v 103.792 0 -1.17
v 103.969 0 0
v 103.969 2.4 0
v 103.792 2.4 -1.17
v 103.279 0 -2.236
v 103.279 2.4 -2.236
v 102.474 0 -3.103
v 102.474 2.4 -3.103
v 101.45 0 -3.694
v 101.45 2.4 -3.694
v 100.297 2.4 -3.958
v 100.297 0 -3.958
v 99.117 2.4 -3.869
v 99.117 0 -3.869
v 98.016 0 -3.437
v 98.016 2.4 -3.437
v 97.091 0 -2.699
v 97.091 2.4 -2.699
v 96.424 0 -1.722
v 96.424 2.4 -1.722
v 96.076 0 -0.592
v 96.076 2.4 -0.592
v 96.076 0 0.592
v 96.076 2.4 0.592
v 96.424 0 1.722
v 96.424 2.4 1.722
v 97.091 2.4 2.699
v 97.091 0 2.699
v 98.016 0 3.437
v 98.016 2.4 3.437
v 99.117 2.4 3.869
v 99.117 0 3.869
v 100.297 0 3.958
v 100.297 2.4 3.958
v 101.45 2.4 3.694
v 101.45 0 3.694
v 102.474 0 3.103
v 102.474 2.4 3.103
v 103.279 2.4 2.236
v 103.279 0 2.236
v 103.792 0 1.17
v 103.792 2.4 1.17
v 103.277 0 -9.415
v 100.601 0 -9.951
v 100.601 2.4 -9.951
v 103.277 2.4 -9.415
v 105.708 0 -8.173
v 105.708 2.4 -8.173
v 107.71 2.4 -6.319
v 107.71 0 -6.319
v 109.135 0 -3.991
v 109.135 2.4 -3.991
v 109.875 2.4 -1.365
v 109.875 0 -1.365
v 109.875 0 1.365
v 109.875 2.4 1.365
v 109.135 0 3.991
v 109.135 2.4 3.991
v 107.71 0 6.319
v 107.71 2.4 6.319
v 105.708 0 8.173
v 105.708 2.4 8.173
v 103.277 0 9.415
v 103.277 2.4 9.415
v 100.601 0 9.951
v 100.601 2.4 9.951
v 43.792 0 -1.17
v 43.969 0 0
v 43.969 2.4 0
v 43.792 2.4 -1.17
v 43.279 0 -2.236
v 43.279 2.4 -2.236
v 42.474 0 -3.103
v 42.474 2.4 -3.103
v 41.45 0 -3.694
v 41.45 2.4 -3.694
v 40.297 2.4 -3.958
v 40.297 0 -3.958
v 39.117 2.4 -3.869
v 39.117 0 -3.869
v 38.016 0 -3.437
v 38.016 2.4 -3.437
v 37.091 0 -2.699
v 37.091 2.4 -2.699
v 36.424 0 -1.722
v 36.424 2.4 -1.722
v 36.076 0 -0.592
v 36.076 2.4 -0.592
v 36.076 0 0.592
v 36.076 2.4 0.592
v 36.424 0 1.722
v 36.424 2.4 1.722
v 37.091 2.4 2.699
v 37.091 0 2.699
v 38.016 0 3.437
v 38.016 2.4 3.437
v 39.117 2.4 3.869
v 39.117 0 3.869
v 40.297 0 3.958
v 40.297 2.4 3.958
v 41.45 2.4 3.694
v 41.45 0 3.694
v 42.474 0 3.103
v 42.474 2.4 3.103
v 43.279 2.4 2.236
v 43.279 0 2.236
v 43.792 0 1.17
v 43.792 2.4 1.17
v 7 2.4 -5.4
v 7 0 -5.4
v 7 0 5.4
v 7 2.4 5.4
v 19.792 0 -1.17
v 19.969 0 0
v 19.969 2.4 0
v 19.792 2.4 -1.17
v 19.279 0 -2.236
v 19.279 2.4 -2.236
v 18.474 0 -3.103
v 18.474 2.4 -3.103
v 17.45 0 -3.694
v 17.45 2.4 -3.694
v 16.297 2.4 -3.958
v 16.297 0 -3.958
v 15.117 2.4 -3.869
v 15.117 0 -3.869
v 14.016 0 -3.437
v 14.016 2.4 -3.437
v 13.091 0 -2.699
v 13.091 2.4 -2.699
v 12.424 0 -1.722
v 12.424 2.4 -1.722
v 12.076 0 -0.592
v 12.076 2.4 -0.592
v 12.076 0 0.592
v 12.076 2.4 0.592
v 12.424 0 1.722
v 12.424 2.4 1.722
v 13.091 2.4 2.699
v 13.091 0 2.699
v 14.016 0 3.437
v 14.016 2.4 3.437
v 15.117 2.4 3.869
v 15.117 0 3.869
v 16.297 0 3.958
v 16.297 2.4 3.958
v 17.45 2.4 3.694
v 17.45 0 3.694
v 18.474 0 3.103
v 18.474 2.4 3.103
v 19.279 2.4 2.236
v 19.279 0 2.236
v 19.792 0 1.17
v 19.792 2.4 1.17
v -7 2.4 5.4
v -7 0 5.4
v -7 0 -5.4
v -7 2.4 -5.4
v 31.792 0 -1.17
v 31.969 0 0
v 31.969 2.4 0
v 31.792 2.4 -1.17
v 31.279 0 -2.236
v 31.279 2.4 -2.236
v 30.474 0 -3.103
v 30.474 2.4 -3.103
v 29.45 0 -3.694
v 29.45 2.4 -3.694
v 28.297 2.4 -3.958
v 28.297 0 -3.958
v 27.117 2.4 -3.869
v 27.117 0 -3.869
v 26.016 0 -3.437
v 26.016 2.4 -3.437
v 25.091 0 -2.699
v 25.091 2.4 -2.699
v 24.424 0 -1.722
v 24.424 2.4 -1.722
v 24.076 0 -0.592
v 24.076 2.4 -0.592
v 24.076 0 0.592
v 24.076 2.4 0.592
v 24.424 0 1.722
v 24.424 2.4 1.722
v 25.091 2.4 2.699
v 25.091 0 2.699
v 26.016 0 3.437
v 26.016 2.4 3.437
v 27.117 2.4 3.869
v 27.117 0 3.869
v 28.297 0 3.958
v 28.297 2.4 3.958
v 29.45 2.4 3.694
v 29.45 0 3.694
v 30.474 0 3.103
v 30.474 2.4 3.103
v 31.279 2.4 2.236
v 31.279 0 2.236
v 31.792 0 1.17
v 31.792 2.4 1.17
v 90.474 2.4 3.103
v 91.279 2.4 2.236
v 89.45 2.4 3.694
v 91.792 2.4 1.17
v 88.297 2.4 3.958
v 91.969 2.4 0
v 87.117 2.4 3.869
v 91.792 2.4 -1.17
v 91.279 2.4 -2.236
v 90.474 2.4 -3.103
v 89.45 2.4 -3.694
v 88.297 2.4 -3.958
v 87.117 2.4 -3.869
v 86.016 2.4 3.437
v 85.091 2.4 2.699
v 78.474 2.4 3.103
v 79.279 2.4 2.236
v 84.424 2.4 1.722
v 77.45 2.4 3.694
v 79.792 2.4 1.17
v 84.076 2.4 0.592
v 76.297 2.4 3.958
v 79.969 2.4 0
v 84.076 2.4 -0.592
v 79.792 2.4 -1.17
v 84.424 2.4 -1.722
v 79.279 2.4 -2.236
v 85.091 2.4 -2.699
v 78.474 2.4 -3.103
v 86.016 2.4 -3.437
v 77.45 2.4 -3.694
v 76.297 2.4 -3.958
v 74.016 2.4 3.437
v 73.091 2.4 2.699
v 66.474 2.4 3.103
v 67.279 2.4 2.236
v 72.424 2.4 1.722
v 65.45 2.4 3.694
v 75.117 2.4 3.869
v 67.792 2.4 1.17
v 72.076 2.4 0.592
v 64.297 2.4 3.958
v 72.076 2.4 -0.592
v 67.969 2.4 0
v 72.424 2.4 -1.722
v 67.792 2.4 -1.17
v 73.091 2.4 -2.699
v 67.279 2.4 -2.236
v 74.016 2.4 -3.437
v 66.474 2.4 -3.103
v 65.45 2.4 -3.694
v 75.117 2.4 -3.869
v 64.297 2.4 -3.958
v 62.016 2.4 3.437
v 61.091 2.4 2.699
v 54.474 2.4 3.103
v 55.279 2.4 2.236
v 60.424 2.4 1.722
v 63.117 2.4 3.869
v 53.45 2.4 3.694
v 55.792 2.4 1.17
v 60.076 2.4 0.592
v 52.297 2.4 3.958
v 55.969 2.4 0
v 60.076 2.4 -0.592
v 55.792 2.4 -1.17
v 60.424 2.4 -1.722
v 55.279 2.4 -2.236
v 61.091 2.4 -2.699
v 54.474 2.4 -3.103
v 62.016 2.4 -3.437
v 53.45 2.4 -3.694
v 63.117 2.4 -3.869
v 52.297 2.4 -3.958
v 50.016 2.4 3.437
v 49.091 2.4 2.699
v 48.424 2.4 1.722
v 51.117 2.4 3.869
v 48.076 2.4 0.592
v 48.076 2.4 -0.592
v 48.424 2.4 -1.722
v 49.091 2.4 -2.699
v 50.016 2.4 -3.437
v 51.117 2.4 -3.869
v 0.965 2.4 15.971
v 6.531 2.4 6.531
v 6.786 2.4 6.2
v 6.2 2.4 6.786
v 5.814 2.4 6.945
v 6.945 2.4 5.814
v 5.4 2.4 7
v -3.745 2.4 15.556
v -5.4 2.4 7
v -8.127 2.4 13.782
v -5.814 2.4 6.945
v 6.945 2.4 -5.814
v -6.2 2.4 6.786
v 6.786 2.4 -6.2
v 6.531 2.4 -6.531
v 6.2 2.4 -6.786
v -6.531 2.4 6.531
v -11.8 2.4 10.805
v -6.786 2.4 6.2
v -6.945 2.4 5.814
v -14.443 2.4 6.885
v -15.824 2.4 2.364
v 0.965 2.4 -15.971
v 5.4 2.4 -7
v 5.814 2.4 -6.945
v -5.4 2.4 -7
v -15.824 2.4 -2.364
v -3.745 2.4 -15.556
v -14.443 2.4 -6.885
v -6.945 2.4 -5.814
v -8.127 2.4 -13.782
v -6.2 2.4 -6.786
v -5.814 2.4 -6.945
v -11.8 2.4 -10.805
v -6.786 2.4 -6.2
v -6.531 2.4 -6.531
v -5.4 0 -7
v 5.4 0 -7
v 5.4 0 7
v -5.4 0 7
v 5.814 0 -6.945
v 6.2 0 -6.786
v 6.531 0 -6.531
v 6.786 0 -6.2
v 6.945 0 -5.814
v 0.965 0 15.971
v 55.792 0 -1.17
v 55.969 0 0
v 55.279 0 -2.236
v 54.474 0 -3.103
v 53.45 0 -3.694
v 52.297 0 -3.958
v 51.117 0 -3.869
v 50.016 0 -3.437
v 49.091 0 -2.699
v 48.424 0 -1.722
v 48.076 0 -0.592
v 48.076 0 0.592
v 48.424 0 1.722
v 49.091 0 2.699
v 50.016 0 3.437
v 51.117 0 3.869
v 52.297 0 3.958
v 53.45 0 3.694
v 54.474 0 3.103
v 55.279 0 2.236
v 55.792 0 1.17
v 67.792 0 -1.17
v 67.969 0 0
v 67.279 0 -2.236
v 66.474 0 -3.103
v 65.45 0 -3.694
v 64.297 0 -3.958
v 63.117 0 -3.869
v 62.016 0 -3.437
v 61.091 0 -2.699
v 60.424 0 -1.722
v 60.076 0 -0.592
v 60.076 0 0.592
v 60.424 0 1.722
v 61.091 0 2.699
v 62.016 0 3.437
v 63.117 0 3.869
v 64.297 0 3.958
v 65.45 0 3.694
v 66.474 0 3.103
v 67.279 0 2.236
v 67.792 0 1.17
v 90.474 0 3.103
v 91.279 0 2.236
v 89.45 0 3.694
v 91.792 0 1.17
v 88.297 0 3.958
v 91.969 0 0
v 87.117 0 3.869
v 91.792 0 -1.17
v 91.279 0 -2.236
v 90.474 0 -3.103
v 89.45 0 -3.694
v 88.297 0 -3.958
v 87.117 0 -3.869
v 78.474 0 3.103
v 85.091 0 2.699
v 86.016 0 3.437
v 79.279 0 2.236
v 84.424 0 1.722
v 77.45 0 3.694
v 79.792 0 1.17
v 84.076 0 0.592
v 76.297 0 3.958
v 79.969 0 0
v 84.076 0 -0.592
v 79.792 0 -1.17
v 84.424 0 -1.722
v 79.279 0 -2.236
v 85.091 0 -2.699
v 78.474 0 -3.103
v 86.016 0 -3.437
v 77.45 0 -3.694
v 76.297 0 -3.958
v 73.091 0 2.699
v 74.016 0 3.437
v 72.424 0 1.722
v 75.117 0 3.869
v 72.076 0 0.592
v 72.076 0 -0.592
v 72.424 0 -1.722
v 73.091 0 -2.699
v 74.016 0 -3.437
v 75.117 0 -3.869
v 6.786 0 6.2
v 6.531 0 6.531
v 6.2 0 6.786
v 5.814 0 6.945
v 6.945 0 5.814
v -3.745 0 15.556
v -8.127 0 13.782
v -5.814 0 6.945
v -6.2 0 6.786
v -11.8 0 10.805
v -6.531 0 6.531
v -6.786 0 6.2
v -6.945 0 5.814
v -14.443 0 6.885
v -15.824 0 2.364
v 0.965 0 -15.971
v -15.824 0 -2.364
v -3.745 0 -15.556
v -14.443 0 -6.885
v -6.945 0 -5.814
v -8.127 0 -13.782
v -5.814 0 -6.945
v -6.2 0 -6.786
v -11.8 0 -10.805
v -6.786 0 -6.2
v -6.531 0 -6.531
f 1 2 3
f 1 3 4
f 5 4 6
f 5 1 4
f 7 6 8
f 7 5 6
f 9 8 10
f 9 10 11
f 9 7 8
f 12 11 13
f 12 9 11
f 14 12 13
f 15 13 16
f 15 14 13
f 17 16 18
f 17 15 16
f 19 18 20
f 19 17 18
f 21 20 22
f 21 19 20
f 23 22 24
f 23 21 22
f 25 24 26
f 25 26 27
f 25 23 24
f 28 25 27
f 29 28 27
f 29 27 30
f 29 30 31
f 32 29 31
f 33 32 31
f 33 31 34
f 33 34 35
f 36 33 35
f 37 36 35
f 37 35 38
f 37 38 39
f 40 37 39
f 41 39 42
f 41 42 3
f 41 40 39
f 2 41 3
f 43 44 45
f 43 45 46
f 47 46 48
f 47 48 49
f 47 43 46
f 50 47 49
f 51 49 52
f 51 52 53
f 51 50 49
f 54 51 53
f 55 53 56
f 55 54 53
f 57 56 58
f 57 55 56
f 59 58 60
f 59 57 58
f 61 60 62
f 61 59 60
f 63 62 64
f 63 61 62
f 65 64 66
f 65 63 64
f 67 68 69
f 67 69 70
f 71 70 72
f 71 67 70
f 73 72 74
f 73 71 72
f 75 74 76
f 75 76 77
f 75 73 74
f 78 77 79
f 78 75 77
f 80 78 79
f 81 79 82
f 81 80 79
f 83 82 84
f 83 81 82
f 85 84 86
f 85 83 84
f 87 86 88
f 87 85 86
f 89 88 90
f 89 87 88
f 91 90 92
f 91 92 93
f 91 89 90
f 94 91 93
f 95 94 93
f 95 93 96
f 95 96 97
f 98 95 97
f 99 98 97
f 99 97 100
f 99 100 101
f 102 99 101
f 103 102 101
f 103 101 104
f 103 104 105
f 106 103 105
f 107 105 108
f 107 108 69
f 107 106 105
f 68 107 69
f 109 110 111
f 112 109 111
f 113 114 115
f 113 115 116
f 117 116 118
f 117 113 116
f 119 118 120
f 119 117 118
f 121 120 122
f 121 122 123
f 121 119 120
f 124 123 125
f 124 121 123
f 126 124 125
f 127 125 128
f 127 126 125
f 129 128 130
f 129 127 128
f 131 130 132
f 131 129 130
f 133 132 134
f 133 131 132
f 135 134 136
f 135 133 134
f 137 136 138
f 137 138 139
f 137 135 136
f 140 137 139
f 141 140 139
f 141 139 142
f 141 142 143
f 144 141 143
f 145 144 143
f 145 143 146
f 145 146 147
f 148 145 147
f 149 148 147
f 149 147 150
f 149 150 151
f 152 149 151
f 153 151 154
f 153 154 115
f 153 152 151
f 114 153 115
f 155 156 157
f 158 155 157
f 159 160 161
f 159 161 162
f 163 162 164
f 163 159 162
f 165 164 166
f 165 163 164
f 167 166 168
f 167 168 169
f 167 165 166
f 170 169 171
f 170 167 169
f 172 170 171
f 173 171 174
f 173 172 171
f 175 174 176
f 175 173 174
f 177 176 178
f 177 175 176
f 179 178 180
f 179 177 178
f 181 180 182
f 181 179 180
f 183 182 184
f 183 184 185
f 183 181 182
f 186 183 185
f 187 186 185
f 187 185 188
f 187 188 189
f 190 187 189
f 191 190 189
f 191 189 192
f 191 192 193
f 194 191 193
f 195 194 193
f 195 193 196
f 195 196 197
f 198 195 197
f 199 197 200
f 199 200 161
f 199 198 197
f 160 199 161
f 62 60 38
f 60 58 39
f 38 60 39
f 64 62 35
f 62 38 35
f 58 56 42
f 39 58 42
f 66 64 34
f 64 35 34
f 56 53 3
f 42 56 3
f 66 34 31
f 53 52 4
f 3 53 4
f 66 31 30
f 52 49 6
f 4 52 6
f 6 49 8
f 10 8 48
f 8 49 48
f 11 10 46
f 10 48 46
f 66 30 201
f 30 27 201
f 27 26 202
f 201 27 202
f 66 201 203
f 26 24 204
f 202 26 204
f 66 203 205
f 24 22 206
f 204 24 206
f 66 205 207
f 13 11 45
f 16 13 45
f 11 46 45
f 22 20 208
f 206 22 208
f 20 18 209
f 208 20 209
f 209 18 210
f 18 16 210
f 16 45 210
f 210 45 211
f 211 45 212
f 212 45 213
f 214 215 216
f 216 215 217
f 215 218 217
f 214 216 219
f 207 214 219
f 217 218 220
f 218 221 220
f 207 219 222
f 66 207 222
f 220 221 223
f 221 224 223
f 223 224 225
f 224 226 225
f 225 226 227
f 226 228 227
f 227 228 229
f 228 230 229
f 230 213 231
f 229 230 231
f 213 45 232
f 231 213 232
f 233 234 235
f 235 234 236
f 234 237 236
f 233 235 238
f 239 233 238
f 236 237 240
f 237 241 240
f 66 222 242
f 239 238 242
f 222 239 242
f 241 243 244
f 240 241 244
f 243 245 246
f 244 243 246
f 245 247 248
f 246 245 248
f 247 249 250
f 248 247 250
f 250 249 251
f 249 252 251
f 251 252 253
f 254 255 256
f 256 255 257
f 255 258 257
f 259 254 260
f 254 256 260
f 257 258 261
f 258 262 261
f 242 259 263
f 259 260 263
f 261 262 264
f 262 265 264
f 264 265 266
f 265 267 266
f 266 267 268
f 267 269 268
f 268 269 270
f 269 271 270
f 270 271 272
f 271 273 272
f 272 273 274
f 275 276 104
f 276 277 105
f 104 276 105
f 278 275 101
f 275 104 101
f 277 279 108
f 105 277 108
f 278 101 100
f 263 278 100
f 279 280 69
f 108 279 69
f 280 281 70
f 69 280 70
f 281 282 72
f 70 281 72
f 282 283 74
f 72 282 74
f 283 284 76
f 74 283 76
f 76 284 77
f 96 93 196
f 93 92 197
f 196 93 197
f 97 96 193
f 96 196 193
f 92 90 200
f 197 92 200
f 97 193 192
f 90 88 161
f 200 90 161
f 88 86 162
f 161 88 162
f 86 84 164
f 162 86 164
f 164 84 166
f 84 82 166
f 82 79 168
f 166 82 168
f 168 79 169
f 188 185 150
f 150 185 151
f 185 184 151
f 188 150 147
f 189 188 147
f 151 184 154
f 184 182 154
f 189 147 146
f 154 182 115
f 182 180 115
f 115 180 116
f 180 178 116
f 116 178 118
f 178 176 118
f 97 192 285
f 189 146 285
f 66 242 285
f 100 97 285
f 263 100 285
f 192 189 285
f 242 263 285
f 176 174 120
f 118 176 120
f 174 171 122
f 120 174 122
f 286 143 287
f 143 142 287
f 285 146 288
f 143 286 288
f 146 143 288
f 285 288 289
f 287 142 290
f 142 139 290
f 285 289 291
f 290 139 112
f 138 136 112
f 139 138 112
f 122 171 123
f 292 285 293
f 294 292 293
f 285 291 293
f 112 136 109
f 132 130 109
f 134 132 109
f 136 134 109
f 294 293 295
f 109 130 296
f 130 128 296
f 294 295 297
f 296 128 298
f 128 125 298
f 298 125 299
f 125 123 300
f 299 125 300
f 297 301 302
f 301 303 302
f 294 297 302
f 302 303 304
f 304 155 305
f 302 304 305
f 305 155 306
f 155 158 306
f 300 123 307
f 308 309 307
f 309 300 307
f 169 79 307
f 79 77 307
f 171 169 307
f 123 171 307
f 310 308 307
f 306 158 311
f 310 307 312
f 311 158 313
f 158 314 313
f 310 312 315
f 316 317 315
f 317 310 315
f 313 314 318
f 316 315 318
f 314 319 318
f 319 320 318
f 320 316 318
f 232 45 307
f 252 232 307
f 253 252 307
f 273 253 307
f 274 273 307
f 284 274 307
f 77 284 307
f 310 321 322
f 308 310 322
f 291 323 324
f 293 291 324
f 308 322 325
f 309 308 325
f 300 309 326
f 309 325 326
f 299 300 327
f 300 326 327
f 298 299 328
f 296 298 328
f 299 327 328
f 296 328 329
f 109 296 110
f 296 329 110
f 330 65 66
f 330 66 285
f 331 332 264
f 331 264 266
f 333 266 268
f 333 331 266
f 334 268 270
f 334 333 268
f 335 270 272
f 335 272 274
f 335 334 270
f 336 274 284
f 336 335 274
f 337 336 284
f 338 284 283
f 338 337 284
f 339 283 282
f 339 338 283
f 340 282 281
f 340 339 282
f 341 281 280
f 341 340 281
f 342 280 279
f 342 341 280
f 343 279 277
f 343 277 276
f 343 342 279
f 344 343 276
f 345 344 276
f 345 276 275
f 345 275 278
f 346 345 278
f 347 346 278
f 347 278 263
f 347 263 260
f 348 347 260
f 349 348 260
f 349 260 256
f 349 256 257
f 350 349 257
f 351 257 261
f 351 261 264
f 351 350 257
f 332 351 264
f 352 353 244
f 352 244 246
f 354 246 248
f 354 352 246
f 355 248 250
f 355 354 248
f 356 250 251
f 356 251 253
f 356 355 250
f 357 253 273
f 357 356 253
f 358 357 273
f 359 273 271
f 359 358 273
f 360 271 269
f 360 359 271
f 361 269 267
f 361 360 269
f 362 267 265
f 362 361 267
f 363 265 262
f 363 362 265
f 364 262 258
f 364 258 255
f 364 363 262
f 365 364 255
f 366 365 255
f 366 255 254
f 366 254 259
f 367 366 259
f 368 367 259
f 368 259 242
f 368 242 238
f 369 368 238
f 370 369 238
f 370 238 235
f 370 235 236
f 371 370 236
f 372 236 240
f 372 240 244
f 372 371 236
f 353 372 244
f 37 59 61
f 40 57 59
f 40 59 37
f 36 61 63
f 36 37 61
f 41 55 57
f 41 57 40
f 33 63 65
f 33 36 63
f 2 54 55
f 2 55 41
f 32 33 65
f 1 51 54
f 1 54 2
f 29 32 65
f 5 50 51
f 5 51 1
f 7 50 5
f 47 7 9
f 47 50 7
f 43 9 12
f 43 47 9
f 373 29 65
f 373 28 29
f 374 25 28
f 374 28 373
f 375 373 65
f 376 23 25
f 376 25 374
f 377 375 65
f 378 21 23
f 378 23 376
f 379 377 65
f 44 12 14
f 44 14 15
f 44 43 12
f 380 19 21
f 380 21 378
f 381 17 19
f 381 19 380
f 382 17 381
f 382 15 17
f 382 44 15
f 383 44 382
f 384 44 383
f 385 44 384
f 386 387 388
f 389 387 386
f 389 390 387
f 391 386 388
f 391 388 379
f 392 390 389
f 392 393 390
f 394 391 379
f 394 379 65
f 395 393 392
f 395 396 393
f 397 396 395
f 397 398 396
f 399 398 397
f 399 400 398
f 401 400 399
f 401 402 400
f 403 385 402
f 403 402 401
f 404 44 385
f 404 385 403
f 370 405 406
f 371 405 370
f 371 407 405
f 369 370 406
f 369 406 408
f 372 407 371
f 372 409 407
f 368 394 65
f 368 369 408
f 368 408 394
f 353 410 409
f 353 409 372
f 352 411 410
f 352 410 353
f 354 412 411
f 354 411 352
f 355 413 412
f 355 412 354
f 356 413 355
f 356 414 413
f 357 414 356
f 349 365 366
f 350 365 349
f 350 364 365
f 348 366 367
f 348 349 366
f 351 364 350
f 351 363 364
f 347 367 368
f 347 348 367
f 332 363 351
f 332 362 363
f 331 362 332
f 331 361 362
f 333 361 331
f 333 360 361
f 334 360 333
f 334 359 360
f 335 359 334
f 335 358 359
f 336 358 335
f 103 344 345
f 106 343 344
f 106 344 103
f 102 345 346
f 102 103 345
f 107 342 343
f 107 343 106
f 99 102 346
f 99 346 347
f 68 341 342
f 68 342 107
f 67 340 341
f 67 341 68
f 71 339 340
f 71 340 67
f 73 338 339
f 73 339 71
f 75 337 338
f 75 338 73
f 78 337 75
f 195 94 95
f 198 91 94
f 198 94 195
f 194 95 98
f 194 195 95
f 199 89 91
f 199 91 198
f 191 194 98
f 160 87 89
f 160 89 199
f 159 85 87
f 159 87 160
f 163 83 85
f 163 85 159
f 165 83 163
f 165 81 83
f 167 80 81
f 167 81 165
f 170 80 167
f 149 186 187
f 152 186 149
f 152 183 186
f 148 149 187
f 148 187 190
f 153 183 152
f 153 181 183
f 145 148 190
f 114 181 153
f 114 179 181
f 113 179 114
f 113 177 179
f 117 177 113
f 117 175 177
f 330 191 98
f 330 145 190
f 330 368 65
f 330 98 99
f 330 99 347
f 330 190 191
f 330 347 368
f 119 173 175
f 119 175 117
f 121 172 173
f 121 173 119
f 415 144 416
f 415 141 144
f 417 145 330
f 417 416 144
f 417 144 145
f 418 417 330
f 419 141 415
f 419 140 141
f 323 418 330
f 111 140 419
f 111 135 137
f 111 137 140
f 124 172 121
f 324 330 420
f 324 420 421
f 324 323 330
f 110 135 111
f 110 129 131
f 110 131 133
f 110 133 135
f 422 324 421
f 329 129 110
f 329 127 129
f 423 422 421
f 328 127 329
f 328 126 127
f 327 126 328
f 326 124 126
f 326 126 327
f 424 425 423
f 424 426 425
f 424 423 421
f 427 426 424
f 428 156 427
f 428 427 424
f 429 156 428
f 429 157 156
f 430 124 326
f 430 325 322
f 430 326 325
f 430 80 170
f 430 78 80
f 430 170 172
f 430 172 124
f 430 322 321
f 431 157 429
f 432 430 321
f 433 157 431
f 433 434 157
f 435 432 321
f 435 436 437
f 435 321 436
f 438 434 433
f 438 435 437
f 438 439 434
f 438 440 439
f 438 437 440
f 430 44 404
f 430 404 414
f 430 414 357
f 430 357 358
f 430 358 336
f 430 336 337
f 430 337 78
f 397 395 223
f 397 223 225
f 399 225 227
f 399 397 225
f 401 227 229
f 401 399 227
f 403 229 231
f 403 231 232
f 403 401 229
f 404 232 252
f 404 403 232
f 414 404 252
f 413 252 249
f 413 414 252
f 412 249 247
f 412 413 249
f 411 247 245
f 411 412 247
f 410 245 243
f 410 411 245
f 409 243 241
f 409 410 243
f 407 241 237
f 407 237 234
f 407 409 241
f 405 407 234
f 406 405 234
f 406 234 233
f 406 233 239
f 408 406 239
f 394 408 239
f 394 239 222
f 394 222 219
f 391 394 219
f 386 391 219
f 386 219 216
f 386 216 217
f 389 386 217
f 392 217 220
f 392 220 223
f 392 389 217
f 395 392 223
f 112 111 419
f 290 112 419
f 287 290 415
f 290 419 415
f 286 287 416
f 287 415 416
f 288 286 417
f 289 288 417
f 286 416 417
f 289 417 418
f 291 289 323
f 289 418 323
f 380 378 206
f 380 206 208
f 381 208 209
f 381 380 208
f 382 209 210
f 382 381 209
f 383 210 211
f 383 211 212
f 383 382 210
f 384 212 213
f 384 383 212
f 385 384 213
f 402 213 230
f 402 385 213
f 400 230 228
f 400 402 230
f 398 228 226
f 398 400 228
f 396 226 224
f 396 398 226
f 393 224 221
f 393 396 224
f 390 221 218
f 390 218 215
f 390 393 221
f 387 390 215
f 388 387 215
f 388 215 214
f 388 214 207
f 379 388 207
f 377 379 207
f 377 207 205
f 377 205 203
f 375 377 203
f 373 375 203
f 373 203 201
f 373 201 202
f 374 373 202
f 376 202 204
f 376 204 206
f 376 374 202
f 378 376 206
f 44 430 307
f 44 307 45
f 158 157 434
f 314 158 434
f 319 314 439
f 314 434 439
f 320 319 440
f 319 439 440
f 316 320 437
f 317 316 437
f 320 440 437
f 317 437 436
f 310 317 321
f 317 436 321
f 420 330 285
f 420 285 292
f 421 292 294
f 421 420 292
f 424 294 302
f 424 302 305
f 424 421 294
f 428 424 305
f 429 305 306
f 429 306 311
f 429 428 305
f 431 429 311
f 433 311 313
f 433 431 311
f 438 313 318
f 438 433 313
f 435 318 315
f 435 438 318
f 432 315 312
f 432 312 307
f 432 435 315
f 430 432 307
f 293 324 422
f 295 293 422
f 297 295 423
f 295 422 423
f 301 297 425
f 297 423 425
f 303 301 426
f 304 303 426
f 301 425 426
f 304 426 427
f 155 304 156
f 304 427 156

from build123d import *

# Parameters (mm, degrees)
SKETCH1_R           = 3.96875
BOSS_EXTRUDE1_DEPTH = 2.4


with BuildPart() as part:
    # Sketch1 → Boss-Extrude1 (new body)
    with BuildSketch(Plane(origin=(0, 0, 0), x_dir=(1, 0, 0), z_dir=(0, 1, 0))):
        with BuildLine():
            Line((0.965, 15.970872706), (100.601240234, 9.950602331))
            ThreePointArc((100.601240234, 9.950602331), (109.96875, 0), (100.601240234, -9.950602331))
            Line((100.601240234, -9.950602331), (0.965, -15.970872706))
            ThreePointArc((0.965, -15.970872706), (-16, 0), (0.965, 15.970872706))
        make_face()
        with Locations((16, 0)):
            Circle(SKETCH1_R, mode=Mode.SUBTRACT)
        with Locations((28, 0)):
            Circle(SKETCH1_R, mode=Mode.SUBTRACT)
        with Locations((40, 0)):
            Circle(SKETCH1_R, mode=Mode.SUBTRACT)
        with Locations((52, 0)):
            Circle(SKETCH1_R, mode=Mode.SUBTRACT)
        with Locations((64, 0)):
            Circle(SKETCH1_R, mode=Mode.SUBTRACT)
        with Locations((76, 0)):
            Circle(SKETCH1_R, mode=Mode.SUBTRACT)
        with Locations((88, 0)):
            Circle(SKETCH1_R, mode=Mode.SUBTRACT)
        with Locations((100, 0)):
            Circle(SKETCH1_R, mode=Mode.SUBTRACT)
        with BuildLine():
            Line((-5.4, 7), (5.4, 7))
            ThreePointArc((5.4, 7), (6.53137085, 6.53137085), (7, 5.4))
            Line((7, 5.4), (7, -5.4))
            ThreePointArc((7, -5.4), (6.53137085, -6.53137085), (5.4, -7))
            Line((5.4, -7), (-5.4, -7))
            ThreePointArc((-5.4, -7), (-6.53137085, -6.53137085), (-7, -5.4))
            Line((-7, -5.4), (-7, 5.4))
            ThreePointArc((-7, 5.4), (-6.53137085, 6.53137085), (-5.4, 7))
        make_face(mode=Mode.SUBTRACT)
    extrude(amount=BOSS_EXTRUDE1_DEPTH)


solid = part.part
